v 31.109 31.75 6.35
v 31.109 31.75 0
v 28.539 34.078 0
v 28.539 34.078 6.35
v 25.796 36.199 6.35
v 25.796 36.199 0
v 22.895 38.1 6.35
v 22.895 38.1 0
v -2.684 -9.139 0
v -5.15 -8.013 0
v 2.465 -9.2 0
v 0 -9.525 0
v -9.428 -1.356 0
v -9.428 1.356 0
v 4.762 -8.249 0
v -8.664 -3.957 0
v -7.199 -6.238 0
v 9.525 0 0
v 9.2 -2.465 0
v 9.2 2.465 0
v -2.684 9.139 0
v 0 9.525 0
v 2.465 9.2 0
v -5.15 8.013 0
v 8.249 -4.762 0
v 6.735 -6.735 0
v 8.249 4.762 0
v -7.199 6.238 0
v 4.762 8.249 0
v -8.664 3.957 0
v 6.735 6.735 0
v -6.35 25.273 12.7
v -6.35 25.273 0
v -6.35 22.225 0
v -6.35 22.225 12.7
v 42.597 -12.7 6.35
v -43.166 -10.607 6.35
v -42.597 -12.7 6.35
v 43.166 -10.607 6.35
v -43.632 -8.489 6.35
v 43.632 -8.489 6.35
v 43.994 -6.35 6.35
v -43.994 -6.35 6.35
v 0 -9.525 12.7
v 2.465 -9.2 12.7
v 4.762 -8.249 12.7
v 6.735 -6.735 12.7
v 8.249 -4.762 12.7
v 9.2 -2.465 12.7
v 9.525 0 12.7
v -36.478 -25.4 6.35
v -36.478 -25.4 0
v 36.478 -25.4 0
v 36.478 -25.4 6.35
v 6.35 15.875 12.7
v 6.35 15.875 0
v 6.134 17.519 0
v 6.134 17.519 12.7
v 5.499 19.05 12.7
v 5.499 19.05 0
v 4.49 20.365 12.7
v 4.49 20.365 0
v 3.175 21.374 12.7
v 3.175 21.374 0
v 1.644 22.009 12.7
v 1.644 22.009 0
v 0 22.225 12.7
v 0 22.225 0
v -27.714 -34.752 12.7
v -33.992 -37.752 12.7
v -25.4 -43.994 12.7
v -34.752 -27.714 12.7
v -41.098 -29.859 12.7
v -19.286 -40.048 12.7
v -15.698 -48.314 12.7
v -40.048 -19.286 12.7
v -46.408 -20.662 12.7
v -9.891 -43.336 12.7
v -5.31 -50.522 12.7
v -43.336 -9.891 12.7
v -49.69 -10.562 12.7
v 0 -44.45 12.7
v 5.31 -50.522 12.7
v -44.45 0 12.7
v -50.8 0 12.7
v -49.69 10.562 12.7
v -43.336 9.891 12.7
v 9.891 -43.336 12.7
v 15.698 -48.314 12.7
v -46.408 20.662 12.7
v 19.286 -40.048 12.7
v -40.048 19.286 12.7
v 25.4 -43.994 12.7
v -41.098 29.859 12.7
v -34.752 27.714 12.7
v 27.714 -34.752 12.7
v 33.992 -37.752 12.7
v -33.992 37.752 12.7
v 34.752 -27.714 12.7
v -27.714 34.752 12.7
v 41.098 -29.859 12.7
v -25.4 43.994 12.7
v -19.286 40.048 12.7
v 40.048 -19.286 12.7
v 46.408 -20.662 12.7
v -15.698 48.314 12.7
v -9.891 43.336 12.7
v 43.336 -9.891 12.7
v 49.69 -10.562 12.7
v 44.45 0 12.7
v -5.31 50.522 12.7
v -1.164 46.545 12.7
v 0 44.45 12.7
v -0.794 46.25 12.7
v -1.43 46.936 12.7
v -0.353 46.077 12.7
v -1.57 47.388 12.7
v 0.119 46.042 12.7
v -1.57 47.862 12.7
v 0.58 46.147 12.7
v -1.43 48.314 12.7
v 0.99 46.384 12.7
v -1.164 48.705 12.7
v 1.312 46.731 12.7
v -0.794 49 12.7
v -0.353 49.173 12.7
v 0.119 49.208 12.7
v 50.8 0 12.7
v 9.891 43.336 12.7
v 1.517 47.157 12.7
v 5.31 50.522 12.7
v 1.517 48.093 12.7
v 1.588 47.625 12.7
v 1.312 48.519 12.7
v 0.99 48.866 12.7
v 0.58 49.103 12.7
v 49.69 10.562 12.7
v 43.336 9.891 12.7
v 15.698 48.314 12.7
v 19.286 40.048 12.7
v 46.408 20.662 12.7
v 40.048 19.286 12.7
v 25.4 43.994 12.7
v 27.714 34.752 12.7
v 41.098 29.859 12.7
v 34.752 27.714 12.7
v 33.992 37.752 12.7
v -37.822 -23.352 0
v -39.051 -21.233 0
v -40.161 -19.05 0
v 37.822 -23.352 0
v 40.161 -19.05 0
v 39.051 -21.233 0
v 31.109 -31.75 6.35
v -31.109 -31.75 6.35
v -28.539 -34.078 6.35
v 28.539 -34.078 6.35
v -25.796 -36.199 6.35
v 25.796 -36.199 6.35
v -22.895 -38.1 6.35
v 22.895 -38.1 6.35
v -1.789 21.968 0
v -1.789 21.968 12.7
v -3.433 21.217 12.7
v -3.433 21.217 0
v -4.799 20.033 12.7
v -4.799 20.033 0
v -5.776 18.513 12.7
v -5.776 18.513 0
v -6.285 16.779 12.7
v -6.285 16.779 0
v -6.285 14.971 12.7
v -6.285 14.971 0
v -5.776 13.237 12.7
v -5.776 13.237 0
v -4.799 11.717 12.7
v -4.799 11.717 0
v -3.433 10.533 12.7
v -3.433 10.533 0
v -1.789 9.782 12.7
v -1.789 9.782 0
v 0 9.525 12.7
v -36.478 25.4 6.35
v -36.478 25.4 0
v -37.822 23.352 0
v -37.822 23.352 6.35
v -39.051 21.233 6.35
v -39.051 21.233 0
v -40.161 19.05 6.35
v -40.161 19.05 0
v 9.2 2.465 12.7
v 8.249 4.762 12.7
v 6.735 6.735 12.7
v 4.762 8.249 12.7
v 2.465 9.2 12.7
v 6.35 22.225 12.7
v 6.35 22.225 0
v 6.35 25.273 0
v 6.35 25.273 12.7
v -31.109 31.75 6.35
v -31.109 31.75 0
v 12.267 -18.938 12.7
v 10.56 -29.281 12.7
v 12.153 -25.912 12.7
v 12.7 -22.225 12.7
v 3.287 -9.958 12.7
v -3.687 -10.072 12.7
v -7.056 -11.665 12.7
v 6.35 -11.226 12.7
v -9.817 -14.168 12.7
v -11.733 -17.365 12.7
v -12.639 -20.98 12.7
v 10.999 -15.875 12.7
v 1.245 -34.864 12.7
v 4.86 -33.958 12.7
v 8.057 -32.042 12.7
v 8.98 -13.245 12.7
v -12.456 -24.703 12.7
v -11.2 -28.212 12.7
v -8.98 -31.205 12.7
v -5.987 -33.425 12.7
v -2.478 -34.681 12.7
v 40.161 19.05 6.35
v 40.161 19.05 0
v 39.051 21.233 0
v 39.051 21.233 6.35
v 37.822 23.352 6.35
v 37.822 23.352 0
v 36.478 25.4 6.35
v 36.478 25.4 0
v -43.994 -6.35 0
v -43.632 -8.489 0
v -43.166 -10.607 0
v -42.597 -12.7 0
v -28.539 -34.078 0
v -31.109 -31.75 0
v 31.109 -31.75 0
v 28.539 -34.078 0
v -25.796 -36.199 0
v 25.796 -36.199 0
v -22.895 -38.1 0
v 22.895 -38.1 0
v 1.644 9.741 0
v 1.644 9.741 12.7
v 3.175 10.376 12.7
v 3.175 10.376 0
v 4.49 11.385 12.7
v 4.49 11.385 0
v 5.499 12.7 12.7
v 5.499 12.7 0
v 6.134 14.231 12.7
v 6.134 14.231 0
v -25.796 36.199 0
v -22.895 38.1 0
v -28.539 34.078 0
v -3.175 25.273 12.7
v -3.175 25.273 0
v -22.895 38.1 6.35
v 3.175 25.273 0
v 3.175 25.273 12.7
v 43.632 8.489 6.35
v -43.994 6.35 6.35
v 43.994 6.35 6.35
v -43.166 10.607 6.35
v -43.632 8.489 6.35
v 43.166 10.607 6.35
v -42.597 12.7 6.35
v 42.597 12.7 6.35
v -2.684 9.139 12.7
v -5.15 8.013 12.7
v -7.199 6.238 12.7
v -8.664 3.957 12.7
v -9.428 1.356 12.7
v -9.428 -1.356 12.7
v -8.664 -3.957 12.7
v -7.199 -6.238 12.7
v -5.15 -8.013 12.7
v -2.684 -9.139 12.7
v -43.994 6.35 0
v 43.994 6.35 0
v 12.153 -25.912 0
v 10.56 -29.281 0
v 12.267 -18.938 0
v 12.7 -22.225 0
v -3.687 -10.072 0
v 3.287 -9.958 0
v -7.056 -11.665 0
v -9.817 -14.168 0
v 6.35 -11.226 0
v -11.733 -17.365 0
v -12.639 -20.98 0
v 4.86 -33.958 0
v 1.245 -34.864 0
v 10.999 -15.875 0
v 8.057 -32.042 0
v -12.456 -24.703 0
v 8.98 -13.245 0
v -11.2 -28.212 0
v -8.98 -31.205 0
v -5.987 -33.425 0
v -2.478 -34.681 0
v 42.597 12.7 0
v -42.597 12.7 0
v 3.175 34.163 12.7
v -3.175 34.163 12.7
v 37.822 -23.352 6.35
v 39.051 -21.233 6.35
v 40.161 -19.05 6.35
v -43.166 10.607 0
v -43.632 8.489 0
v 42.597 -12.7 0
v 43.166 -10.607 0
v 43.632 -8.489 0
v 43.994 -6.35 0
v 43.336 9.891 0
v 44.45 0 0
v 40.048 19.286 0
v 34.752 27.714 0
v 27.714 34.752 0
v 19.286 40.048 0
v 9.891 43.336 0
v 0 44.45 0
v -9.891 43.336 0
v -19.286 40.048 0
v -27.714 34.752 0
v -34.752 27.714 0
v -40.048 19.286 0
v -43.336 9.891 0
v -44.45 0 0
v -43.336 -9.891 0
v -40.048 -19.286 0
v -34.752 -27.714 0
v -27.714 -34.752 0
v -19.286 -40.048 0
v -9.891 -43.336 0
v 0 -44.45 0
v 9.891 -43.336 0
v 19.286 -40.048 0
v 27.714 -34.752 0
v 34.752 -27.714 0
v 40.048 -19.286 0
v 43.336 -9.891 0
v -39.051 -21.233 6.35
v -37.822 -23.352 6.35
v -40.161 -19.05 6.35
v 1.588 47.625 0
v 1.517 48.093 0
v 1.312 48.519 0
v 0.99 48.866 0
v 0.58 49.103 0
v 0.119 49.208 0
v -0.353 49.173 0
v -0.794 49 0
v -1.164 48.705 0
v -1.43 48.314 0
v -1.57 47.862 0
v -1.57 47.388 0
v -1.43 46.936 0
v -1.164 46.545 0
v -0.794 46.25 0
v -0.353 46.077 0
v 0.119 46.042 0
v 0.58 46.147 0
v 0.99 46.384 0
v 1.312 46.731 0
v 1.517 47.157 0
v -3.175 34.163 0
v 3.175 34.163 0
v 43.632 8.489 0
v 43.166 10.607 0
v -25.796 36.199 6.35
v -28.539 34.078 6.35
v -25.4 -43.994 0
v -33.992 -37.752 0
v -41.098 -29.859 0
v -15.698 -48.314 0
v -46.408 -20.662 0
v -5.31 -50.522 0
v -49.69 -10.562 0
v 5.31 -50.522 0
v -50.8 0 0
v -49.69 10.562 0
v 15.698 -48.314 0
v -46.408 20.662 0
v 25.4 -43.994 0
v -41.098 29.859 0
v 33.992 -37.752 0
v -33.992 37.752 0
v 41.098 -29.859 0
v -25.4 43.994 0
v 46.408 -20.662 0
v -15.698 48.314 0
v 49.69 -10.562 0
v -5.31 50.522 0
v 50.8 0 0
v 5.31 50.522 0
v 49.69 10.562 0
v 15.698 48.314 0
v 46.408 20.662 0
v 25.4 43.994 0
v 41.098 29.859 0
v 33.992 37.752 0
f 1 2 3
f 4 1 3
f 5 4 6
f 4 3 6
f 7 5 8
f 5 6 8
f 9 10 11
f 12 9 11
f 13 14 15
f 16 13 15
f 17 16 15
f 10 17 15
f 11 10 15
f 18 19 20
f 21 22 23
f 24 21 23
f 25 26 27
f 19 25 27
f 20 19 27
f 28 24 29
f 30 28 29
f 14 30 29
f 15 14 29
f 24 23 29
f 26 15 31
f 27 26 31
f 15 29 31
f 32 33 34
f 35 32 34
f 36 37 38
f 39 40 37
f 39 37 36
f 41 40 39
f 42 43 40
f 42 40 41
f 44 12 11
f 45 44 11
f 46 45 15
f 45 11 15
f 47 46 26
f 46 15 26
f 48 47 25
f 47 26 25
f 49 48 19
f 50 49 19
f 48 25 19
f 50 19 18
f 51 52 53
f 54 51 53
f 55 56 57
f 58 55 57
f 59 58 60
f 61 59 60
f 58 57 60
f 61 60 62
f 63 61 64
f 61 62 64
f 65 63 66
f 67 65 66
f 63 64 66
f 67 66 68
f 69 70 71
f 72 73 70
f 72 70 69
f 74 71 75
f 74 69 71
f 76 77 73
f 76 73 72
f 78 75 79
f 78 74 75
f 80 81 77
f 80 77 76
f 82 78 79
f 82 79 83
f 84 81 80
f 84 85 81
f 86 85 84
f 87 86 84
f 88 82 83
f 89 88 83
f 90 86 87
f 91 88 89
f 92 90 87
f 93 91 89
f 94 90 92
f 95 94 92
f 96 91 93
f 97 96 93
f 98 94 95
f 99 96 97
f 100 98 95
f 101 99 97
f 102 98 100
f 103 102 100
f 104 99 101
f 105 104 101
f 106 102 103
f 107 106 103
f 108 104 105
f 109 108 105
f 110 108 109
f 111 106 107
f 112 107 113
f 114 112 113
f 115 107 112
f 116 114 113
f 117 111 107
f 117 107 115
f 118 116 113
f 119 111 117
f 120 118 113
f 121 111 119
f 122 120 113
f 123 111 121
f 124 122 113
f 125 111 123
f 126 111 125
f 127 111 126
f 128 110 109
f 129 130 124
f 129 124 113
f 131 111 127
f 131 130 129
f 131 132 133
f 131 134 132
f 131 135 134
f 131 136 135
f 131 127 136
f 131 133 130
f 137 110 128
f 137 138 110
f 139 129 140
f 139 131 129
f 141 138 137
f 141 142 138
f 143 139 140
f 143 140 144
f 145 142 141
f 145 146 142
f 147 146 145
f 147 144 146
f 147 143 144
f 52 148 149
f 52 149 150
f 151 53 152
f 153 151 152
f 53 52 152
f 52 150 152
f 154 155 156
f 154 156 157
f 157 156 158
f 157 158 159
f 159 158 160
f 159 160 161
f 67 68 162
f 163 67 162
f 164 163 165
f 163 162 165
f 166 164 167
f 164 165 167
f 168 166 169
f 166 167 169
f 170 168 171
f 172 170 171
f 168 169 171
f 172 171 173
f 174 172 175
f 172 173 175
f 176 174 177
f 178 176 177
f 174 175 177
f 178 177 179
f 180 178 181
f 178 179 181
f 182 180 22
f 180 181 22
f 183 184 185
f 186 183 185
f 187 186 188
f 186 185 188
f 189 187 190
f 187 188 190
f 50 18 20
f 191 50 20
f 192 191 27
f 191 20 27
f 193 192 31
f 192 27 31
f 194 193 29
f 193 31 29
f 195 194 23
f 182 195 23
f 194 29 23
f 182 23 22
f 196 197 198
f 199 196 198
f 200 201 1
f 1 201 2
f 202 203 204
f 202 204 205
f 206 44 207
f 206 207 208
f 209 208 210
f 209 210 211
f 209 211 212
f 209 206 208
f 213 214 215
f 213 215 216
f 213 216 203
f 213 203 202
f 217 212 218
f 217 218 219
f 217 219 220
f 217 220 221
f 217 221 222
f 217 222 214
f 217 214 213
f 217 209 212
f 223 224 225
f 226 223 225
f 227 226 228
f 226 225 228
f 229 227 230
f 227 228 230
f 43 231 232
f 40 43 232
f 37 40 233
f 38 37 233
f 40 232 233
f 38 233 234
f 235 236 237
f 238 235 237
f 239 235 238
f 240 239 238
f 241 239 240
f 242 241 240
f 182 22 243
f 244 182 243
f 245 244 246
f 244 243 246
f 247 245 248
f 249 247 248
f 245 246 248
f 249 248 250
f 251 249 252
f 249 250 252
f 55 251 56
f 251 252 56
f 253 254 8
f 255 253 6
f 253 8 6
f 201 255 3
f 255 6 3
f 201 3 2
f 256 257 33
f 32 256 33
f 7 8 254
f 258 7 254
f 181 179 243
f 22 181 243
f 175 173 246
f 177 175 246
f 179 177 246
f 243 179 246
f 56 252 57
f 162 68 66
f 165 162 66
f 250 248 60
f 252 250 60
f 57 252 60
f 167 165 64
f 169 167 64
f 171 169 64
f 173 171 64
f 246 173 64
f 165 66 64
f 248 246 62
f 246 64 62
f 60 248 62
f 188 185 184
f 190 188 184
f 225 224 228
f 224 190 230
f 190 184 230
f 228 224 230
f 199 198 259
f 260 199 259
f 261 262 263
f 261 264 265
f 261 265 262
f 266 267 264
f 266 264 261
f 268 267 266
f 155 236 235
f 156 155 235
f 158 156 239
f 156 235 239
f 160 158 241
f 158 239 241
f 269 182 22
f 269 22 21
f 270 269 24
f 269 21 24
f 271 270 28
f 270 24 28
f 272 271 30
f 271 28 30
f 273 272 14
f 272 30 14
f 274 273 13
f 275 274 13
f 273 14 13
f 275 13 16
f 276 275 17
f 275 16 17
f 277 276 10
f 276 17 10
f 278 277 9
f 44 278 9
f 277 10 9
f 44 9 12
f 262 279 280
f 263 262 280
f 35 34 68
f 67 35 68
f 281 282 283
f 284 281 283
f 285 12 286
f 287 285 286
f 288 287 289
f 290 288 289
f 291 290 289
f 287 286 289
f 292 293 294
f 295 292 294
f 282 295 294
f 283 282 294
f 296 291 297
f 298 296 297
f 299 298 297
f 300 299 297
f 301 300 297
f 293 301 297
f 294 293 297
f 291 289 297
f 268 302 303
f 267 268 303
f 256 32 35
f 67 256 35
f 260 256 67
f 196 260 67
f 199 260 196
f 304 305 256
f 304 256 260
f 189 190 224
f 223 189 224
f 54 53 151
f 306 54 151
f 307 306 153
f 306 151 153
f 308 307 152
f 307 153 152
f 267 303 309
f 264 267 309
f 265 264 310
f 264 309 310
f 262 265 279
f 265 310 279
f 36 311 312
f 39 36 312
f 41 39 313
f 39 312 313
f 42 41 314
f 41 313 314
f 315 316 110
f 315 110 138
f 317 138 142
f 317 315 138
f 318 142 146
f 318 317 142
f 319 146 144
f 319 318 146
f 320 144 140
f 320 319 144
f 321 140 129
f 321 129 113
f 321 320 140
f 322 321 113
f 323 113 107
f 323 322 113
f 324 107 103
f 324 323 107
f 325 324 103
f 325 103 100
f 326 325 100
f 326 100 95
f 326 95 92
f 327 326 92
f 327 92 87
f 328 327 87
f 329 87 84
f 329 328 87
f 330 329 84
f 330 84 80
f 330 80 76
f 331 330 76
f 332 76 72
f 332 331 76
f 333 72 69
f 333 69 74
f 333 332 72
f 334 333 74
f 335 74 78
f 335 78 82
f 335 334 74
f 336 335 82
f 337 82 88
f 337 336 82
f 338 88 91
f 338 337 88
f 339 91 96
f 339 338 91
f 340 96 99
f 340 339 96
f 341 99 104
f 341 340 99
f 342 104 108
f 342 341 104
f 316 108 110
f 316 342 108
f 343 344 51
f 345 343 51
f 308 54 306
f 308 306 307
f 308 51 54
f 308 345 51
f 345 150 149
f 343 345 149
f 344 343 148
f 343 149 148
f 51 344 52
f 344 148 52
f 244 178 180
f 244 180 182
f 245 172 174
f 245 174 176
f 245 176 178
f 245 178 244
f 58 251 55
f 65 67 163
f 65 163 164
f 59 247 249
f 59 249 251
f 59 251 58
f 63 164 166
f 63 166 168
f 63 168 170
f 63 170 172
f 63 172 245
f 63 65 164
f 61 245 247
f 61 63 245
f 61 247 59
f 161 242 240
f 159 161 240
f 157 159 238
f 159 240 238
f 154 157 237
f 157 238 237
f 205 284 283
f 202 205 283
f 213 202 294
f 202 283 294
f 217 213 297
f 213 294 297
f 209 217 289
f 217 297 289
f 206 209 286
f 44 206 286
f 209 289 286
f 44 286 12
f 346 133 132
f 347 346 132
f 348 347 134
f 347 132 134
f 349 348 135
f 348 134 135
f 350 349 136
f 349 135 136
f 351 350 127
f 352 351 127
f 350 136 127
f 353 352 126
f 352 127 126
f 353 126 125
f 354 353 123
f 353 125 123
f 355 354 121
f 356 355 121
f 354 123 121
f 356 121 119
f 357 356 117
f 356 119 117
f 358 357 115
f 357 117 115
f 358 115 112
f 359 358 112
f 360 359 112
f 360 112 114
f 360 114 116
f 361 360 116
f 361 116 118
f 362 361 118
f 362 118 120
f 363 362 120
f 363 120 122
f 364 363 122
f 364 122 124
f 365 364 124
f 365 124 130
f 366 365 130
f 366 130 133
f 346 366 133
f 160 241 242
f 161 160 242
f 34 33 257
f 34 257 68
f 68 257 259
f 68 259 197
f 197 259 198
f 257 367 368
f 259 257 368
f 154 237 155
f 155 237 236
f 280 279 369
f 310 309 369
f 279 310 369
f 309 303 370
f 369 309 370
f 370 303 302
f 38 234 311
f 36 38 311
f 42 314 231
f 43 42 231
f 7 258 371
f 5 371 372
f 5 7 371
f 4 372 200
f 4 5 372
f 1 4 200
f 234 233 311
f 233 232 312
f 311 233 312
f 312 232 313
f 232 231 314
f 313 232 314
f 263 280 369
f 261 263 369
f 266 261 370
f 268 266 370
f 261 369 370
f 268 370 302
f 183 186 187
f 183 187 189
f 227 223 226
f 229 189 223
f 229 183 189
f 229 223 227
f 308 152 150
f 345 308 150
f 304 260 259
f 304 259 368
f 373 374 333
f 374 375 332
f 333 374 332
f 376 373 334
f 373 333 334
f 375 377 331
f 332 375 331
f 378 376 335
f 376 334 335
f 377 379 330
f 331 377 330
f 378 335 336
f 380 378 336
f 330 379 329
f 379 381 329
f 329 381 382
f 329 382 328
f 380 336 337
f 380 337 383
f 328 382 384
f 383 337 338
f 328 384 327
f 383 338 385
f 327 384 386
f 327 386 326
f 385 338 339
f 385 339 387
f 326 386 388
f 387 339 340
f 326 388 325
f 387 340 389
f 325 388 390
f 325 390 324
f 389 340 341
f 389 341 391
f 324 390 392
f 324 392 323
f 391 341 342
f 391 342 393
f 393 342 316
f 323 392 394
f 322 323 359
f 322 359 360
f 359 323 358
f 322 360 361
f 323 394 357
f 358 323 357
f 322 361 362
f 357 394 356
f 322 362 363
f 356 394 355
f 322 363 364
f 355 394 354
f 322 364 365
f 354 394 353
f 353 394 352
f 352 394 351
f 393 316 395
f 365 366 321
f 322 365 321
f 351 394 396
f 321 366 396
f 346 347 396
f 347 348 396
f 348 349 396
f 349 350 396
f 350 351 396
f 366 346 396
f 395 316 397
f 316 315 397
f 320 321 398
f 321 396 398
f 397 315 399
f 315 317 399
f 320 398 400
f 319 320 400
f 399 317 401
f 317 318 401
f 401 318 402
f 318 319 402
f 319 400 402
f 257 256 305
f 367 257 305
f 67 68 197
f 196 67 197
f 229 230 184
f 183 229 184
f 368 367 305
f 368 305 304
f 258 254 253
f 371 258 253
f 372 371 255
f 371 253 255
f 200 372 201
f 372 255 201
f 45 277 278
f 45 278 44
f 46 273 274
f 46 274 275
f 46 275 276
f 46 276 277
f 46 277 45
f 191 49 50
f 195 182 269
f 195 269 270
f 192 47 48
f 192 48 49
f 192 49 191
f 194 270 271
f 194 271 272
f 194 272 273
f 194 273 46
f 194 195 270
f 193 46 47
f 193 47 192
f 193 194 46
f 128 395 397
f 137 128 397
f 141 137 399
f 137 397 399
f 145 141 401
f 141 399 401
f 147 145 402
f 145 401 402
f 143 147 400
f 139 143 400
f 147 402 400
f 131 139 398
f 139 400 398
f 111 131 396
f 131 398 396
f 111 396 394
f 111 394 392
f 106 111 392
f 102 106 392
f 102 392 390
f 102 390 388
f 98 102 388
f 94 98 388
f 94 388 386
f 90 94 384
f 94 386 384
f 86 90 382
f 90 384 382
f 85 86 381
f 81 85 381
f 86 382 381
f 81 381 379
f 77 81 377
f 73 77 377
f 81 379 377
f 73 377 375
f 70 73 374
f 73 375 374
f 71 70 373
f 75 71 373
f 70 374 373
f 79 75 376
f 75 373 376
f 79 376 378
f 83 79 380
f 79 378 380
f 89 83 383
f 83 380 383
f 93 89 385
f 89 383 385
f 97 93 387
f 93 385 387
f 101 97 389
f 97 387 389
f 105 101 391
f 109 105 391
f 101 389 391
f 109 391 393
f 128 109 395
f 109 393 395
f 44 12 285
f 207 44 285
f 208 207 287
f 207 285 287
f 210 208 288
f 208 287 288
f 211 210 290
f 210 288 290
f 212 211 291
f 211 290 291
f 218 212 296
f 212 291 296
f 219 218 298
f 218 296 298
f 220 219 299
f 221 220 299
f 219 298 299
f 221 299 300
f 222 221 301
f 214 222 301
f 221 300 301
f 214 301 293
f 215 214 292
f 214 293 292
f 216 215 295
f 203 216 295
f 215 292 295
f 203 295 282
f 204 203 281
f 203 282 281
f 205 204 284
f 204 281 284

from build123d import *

# Parameters (mm, degrees)
F0_R     = 50.8
F0_R_2   = 44.45
F0_W     = 6.35
F0_H     = 8.89
F2_DEPTH = 12.7
F3_DEPTH = 6.35
F4_R     = 1.5875
F5_DEPTH = 25.4


with BuildPart() as f2:
    # F0 (on Top) → F2 (new body)
    with BuildSketch(Plane.XY):
        Circle(F0_R)
        Circle(F0_R_2, mode=Mode.SUBTRACT)
        with Locations((0, 29.718)):
            Rectangle(F0_W, F0_H)
        Polygon((-6.35, 22.225), (0, 22.225), (6.35, 22.225), (6.35, 25.273), (3.175, 25.273), (-3.175, 25.273), (-6.35, 25.273), align=None)
        with BuildLine():
            ThreePointArc((0, 22.225), (-6.35, 15.875), (0, 9.525))
            ThreePointArc((0, 9.525), (4.490128, 11.384872), (6.35, 15.875))
            ThreePointArc((6.35, 15.875), (4.490128, 20.365128), (0, 22.225))
        make_face()
        with BuildLine():
            ThreePointArc((0, -9.525), (6.735192, -6.735192), (9.525, 0))
            ThreePointArc((9.525, 0), (6.735192, 6.735192), (0, 9.525))
            ThreePointArc((0, 9.525), (-9.525, 0), (0, -9.525))
        make_face()
        with BuildLine():
            ThreePointArc((12.7, -22.225), (8.980256, -13.244744), (0, -9.525))
            ThreePointArc((0, -9.525), (-8.980256, -31.205256), (12.7, -22.225))
        make_face()
    extrude(amount=F2_DEPTH)

    # F4 (on face) → F5 (cut)
    with BuildSketch(Plane.XY.offset(12.7)):
        with Locations((0, 47.625)):
            Circle(F4_R)
    extrude(amount=-F5_DEPTH, mode=Mode.SUBTRACT)


with BuildPart() as f3:
    # F1 (on Top) → F3 (new body)
    with BuildSketch(Plane.XY):
        with BuildLine():
            Line((-31.10852, 31.75), (31.10852, 31.75))
            ThreePointArc((31.10852, 31.75), (27.18791, 35.165609), (22.895251, 38.1))
            Line((22.895251, 38.1), (-22.895251, 38.1))
            ThreePointArc((-22.895251, 38.1), (-27.18791, 35.165609), (-31.10852, 31.75))
        make_face()
        with BuildLine():
            Line((-40.160926, 19.05), (40.160926, 19.05))
            ThreePointArc((40.160926, 19.05), (38.450759, 22.301158), (36.477973, 25.4))
            Line((36.477973, 25.4), (-36.477973, 25.4))
            ThreePointArc((-36.477973, 25.4), (-38.450759, 22.301158), (-40.160926, 19.05))
        make_face()
        with BuildLine():
            Line((-43.994091, 6.35), (43.994091, 6.35))
            ThreePointArc((43.994091, 6.35), (43.411853, 9.550577), (42.597095, 12.7))
            Line((42.597095, 12.7), (-42.597095, 12.7))
            ThreePointArc((-42.597095, 12.7), (-43.411853, 9.550577), (-43.994091, 6.35))
        make_face()
        with BuildLine():
            ThreePointArc((42.597095, -12.7), (43.411853, -9.550577), (43.994091, -6.35))
            Line((43.994091, -6.35), (-43.994091, -6.35))
            ThreePointArc((-43.994091, -6.35), (-43.411853, -9.550577), (-42.597095, -12.7))
            Line((-42.597095, -12.7), (42.597095, -12.7))
        make_face()
        with BuildLine():
            ThreePointArc((36.477973, -25.4), (38.450759, -22.301158), (40.160926, -19.05))
            Line((40.160926, -19.05), (-40.160926, -19.05))
            ThreePointArc((-40.160926, -19.05), (-38.450759, -22.301158), (-36.477973, -25.4))
            Line((-36.477973, -25.4), (36.477973, -25.4))
        make_face()
        with BuildLine():
            ThreePointArc((22.895251, -38.1), (27.18791, -35.165609), (31.10852, -31.75))
            Line((31.10852, -31.75), (-31.10852, -31.75))
            ThreePointArc((-31.10852, -31.75), (-27.18791, -35.165609), (-22.895251, -38.1))
            Line((-22.895251, -38.1), (22.895251, -38.1))
        make_face()
    extrude(amount=F3_DEPTH)


solid = Compound([f2.part, f3.part])
